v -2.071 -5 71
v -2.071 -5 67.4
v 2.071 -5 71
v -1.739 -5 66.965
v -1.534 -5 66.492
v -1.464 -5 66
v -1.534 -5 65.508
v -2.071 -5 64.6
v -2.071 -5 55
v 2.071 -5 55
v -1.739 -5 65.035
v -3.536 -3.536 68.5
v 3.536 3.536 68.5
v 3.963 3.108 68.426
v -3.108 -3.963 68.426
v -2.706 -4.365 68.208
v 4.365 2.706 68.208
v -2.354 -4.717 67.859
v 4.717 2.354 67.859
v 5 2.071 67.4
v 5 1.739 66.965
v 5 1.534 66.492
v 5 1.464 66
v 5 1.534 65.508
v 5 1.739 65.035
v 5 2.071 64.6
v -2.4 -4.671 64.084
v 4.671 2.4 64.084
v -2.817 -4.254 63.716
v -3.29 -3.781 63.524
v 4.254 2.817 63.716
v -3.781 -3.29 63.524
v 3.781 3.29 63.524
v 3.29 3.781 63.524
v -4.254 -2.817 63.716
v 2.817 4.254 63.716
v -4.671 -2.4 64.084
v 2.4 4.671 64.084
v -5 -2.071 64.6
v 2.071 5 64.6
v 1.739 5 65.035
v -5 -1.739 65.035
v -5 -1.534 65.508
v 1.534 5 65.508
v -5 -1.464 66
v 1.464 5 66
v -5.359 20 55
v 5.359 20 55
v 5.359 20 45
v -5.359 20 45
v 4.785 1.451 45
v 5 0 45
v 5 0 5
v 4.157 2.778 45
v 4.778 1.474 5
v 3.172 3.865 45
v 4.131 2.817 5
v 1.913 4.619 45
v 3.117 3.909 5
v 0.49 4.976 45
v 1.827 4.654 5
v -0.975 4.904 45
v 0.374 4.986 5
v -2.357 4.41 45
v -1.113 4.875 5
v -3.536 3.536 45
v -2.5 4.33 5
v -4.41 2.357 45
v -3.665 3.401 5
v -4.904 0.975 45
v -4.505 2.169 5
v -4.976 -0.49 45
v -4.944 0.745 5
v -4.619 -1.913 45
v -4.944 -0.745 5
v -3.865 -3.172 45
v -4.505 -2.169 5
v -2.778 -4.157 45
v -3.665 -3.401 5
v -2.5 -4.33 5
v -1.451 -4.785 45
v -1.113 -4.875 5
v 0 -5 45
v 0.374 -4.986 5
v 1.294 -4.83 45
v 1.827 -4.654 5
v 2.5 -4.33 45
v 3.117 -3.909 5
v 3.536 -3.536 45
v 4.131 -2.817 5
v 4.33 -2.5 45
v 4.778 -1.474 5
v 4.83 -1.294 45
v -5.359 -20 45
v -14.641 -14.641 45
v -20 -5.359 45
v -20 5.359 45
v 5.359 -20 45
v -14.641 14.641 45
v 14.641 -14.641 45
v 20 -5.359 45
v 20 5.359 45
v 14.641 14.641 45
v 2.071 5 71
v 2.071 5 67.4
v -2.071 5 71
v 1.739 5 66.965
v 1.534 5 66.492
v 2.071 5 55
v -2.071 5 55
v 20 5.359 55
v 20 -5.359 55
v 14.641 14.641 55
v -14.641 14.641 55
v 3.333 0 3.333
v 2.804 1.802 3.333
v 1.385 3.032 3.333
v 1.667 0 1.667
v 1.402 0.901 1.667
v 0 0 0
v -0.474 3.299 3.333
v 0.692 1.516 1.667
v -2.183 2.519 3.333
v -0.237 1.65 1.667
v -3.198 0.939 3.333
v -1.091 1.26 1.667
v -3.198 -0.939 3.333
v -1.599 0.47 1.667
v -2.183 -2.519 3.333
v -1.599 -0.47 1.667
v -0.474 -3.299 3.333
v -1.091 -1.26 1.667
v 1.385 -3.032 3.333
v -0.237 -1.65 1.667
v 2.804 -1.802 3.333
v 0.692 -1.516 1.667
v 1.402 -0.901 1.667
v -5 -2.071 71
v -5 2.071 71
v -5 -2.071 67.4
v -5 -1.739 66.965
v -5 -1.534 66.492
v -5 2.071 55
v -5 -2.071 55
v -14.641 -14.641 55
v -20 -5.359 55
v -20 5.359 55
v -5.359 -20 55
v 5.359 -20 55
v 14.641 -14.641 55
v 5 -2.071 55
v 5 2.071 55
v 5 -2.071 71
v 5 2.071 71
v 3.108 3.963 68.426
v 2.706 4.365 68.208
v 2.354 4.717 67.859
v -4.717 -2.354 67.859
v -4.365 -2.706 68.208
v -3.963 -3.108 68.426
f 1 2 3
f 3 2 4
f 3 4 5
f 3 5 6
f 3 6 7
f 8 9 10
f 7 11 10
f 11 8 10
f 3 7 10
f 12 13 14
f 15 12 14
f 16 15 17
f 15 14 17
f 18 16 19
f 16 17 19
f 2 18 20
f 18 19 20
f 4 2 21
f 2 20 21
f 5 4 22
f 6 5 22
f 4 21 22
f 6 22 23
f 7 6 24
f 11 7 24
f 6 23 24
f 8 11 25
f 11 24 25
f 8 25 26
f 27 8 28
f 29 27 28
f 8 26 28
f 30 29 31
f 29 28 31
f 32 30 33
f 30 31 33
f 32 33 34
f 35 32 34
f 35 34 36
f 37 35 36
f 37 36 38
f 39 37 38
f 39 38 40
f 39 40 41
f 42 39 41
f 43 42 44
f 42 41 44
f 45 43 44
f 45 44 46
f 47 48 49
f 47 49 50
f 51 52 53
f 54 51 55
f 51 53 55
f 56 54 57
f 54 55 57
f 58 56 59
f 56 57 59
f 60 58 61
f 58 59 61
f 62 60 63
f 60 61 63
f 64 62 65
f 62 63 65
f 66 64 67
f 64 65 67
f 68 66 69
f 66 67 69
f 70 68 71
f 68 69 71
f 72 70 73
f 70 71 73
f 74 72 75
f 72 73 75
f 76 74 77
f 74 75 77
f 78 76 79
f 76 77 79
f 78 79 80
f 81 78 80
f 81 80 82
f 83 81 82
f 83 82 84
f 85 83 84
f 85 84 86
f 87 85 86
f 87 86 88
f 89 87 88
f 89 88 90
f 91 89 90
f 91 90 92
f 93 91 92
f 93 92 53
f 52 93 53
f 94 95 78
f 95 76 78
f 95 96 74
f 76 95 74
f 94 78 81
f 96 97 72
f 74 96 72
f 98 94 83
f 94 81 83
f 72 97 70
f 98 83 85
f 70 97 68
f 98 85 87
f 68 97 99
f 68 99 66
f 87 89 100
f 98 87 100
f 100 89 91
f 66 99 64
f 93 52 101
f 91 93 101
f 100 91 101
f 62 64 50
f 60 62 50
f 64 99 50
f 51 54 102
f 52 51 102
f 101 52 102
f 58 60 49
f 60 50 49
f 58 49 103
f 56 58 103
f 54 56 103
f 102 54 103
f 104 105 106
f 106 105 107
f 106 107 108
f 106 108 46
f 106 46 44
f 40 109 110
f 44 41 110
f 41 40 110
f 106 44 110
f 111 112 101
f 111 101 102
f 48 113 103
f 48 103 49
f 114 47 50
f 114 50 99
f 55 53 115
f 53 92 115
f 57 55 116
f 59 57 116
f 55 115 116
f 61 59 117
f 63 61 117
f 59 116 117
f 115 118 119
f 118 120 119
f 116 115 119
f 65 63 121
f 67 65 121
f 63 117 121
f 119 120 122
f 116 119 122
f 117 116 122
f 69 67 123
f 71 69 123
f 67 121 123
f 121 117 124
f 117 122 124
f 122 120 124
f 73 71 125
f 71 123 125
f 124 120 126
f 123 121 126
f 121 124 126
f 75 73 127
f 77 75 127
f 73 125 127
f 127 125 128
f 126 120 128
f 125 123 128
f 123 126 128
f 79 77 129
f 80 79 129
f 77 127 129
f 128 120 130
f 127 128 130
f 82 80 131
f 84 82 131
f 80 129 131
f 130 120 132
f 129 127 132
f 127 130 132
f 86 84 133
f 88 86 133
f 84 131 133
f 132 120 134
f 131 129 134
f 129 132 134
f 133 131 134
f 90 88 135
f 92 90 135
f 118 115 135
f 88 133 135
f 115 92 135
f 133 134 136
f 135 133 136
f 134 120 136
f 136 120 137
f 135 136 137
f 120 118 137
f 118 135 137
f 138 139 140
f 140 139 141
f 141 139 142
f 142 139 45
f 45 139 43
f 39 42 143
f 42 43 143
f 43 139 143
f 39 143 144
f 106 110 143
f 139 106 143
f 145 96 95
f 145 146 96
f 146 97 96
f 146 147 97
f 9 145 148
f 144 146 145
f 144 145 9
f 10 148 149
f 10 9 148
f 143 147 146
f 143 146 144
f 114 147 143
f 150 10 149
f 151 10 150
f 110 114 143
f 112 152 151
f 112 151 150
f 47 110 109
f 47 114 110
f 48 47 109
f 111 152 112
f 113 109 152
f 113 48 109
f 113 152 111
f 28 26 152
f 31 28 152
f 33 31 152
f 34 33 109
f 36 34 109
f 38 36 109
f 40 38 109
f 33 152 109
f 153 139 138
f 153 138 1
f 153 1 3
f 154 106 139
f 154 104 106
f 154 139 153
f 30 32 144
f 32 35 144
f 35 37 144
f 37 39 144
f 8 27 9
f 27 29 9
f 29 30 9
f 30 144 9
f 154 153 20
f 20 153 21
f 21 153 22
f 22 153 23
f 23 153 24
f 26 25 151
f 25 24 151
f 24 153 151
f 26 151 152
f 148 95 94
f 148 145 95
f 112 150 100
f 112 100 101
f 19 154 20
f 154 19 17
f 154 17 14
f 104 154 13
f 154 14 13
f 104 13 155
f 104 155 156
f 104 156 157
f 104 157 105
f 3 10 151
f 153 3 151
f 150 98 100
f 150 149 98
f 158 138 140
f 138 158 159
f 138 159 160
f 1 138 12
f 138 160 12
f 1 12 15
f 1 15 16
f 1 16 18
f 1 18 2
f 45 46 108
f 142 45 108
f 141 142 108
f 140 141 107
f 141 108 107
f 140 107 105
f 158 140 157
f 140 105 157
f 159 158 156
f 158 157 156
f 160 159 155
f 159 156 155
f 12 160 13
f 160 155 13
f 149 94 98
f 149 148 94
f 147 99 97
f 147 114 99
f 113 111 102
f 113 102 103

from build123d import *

# Parameters (mm, degrees)
F0_R          = 5
F1_DEPTH      = 50
F2_SIZE       = 5
F5_DEPTH      = 5
F5_DEPTH_BACK = 5
F6_DEPTH      = 5
F8_DEPTH      = 16
F10_DEPTH     = 25


with BuildPart() as f1:
    # F0 (on Top) → F1 (new body)
    with BuildSketch(Plane.XY):
        Circle(F0_R)
    extrude(amount=F1_DEPTH)

    # F2
    f2_edges = [f1.edges().sort_by_distance(p)[0] for p in [
        (-5, 0, 0),
    ]]
    chamfer(f2_edges, length=F2_SIZE)

    # F3 (on face) → F5 (join, two sides)
    with BuildSketch(Plane.XY.offset(50)) as f5_sk:
        Polygon((0, -20), (5.3589838486, -20), (14.6410161514, -14.6410161514), (20, -5.3589838486), (20, 5.3589838486), (14.6410161514, 14.6410161514), (5.3589838486, 20), (-5.3589838486, 20), (-14.6410161514, 14.6410161514), (-20, 5.3589838486), (-20, -5.3589838486), (-14.6410161514, -14.6410161514), (-5.3589838486, -20), align=None)
        with BuildLine():
            ThreePointArc((5, 0), (3.5355339059, -3.5355339059), (0, -5))
            ThreePointArc((0, -5), (-3.5355339059, 3.5355339059), (5, 0))
        make_face(mode=Mode.SUBTRACT)
    extrude(amount=F5_DEPTH)
    extrude(f5_sk.sketch, amount=-F5_DEPTH_BACK)

    # F4 (on face) → F6 (join)
    with BuildSketch(Plane.XY.offset(50)):
        with BuildLine():
            ThreePointArc((5, 0), (-3.5355339059, 3.5355339059), (0, -5))
            ThreePointArc((0, -5), (3.5355339059, -3.5355339059), (5, 0))
        make_face()
    extrude(amount=F6_DEPTH)

    # F7 (on face) → F8 (join)
    with BuildSketch(Plane.XY.offset(55)):
        Polygon((0, 5), (-2.0710678119, 5), (-5, 2.0710678119), (-5, -2.0710678119), (-2.0710678119, -5), (2.0710678119, -5), (5, -2.0710678119), (5, 2.0710678119), (2.0710678119, 5), align=None)
    extrude(amount=F8_DEPTH)

    # F9 (on face) → F10 (cut)
    with BuildSketch(Plane(origin=(3.5355339059, 3.5355339059, 0), x_dir=(-0.7071067812, 0.7071067812, 0), z_dir=(0.7071067812, 0.7071067812, 0))):
        with BuildLine():
            ThreePointArc((0, 68.5), (-1.767766953, 64.232233047), (2.5, 66))
            ThreePointArc((2.5, 66), (1.767766953, 67.767766953), (0, 68.5))
        make_face()
    extrude(amount=-F10_DEPTH, mode=Mode.SUBTRACT)


solid = f1.part
